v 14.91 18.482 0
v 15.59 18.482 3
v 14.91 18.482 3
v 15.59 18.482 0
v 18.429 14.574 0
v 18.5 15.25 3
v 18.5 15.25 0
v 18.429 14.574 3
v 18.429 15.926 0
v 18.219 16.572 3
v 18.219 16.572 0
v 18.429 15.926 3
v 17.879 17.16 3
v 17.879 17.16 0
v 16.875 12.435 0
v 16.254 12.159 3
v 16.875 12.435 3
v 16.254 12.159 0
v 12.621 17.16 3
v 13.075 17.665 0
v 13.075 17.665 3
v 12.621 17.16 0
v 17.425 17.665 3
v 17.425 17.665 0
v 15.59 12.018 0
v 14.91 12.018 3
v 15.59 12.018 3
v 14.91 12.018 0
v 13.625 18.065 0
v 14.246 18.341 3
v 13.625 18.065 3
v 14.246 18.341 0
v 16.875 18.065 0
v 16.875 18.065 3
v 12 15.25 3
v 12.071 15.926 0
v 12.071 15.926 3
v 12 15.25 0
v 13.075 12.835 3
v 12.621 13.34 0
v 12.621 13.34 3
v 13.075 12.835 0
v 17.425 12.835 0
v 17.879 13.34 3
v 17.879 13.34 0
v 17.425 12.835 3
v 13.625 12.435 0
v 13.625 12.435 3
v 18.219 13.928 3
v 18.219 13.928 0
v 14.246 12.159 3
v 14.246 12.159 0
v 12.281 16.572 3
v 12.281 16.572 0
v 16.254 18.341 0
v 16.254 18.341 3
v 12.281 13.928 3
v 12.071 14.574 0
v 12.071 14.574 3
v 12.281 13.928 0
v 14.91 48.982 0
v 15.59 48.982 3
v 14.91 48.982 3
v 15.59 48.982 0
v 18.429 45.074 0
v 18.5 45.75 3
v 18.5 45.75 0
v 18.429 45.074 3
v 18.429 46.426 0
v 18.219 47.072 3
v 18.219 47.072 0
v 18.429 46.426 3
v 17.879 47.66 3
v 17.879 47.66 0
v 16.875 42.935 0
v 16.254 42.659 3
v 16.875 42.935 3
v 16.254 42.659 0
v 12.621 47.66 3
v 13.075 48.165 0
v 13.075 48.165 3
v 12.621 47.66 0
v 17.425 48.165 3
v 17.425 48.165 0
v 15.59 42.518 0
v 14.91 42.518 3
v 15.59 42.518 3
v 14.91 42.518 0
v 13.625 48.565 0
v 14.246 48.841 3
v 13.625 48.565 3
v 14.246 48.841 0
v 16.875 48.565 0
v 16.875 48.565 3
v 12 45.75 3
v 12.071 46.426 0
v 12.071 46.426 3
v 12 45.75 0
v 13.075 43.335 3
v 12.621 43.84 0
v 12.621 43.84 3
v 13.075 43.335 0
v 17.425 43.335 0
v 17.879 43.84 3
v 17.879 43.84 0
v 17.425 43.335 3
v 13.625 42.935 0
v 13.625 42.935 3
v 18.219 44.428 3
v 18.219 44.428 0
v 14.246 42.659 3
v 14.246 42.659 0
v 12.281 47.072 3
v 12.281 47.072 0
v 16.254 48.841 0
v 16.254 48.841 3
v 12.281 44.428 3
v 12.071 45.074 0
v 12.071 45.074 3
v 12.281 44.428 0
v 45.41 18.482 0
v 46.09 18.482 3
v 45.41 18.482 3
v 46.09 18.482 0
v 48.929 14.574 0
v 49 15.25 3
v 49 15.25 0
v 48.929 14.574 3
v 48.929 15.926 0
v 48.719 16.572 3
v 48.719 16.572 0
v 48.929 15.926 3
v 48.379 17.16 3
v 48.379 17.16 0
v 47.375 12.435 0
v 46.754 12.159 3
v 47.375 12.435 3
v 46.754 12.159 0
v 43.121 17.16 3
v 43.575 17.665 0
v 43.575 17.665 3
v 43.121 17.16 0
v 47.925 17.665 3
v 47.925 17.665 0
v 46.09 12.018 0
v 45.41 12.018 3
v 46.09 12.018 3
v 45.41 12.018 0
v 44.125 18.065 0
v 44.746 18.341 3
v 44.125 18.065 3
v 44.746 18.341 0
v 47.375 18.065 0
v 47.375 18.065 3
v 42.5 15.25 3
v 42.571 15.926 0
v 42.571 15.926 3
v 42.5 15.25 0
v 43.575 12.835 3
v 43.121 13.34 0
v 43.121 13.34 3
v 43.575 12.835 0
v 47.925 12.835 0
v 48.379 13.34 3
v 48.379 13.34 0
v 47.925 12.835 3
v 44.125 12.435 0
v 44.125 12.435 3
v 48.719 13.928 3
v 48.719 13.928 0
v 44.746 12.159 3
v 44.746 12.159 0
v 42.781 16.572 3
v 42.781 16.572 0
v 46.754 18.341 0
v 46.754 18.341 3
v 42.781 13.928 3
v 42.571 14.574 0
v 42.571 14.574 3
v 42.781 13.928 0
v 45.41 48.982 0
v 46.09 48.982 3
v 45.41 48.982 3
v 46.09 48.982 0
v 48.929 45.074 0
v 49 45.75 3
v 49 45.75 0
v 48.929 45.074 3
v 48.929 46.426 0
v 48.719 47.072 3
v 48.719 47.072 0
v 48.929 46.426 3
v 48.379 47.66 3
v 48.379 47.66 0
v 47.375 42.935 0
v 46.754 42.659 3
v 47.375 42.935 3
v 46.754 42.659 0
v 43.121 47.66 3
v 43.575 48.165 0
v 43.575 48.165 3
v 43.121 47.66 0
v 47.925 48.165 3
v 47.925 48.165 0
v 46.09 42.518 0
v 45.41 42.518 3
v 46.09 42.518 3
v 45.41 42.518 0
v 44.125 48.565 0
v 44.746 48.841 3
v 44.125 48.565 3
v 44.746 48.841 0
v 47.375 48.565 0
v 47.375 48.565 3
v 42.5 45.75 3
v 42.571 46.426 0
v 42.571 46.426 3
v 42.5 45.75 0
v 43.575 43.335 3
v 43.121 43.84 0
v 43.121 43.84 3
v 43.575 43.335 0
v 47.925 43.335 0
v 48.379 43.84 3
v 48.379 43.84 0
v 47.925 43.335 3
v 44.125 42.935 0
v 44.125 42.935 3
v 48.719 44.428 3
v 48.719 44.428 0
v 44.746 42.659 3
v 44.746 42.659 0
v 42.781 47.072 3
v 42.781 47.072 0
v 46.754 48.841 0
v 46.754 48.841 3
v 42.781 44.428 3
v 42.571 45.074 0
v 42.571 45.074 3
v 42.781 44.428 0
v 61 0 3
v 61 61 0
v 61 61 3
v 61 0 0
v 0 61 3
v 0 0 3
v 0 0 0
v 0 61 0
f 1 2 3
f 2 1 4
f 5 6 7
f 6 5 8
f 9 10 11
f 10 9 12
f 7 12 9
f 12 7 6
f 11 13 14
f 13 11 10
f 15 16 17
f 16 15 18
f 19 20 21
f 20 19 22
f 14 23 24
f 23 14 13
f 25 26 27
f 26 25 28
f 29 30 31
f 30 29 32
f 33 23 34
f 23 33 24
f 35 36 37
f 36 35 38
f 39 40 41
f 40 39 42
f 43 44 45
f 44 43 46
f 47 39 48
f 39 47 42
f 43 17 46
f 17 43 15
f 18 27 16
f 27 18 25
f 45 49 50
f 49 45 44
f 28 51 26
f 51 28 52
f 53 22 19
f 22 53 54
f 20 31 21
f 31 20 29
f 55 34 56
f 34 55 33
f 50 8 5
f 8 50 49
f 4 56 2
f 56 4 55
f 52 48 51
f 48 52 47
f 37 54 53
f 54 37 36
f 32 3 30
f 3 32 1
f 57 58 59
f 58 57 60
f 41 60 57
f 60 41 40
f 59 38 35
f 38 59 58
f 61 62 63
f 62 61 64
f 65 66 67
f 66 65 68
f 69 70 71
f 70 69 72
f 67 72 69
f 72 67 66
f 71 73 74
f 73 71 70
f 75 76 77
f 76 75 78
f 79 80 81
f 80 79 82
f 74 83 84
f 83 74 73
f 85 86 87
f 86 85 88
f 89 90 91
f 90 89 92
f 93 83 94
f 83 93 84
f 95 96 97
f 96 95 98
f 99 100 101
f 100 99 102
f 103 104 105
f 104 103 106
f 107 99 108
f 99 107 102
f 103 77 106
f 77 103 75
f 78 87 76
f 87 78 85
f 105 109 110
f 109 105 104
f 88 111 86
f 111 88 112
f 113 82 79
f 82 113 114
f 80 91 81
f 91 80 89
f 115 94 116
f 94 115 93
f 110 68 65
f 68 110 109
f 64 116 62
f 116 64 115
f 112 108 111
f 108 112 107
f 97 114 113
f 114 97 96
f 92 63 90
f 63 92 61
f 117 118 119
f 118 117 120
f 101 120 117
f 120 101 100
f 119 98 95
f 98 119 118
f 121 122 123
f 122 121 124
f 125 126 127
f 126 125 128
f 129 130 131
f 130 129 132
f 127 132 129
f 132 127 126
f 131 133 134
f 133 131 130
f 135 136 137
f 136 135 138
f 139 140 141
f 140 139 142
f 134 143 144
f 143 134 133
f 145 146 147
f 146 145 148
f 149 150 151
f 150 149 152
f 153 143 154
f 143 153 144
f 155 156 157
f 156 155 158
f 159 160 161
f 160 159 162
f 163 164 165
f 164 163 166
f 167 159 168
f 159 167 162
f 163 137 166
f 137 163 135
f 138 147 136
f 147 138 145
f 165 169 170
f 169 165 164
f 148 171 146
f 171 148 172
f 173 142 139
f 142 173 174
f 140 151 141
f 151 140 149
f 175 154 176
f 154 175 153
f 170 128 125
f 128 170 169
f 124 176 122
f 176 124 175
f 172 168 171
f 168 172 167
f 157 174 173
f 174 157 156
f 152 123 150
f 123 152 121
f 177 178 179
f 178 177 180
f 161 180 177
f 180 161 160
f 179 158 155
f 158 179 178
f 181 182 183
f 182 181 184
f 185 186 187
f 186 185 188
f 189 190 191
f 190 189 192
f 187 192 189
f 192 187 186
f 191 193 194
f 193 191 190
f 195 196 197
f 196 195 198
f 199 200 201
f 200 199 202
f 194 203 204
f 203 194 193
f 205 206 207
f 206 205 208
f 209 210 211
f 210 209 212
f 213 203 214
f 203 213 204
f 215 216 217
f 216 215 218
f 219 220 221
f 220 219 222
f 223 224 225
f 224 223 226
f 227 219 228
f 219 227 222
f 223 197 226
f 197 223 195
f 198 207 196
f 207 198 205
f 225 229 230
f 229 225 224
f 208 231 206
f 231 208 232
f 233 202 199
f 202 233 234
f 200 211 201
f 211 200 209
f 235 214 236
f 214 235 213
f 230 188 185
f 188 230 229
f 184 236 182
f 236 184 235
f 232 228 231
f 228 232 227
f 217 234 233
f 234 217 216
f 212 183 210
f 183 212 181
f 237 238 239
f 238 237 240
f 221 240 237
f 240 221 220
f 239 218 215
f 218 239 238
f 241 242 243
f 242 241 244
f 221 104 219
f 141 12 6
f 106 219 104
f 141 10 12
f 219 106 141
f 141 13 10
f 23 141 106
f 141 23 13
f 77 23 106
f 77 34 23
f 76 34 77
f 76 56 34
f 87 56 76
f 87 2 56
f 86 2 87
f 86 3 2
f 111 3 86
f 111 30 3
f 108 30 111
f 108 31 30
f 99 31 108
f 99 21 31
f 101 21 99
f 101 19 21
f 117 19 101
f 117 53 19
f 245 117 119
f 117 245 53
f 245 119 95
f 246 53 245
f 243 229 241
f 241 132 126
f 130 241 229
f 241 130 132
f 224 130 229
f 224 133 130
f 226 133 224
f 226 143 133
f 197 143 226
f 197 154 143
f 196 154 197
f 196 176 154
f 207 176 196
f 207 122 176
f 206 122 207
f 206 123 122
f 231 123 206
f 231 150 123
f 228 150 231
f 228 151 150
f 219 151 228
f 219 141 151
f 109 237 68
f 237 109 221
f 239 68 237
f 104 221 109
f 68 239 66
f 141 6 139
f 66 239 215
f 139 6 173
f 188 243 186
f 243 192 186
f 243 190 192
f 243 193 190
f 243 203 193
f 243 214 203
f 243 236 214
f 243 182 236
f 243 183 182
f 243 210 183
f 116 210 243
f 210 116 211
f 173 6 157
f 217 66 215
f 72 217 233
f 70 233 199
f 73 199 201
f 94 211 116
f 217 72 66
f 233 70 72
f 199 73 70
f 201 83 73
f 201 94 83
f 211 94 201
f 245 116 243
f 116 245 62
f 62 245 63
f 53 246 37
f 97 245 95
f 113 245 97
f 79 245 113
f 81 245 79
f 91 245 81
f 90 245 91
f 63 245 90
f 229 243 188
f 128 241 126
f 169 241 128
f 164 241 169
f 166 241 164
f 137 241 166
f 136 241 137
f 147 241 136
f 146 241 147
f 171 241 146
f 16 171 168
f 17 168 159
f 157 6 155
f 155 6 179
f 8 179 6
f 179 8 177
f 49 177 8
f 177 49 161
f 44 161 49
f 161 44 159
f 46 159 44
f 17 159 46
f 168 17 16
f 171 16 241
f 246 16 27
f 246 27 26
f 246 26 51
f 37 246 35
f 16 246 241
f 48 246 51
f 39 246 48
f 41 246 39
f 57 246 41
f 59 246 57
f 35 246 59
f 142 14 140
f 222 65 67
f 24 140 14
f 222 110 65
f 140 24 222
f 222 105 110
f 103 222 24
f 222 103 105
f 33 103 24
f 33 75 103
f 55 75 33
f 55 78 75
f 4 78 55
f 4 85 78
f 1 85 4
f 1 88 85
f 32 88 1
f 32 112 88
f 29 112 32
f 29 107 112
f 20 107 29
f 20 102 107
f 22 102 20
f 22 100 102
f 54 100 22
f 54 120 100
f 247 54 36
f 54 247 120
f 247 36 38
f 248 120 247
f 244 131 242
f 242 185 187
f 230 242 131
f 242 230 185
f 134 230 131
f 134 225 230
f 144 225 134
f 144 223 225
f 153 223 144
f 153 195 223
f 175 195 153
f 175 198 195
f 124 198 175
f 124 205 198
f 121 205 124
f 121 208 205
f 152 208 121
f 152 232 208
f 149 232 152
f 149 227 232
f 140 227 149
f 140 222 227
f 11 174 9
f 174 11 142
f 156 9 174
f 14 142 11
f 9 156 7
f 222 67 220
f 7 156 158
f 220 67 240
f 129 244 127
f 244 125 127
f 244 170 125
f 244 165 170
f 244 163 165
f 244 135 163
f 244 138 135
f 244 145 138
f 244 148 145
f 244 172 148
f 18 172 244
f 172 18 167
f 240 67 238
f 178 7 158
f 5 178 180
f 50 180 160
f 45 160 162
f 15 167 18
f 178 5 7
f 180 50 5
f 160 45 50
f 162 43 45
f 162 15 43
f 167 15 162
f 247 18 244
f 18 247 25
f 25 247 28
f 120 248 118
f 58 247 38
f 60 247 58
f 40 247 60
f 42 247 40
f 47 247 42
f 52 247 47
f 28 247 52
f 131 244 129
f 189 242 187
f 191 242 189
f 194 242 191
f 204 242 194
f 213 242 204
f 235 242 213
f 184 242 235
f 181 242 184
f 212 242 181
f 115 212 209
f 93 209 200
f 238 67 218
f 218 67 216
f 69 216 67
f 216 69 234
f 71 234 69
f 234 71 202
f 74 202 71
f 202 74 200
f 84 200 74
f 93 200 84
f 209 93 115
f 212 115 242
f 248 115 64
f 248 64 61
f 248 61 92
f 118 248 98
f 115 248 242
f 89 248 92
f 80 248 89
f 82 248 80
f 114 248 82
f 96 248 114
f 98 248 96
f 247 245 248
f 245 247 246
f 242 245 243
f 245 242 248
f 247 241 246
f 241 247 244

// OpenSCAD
// file: ../888_1010.scad
include <../parameters.scad>


module 888_1010() {
	difference() {
		cube([ALU_profile_width*2, ALU_profile_width*2, 3]);

		for(i=[0:1:1]) {
			for(k=[0:1:1]) {
				translate([ALU_profile_width/2+ALU_profile_width*i, ALU_profile_width/2+ALU_profile_width*k, -1])
				cylinder(d=M6_screw_diameter, h=5, $fn=30);
			}
		}
	}
}

888_1010();
// file: ../../parameters.scad
maximum_printable_size = 150;

layer_thickness = 0.3;
global_clearance = 0.5;


//Screw diameter and nut for M10 [mm]
M10_screw_diameter = 10.4;
M10_head_height = 10;
M10_head_diameter = 16+0.5;
M10_nut_height = 10.5;
M10_nut_diameter = 25.5;
M10_nut_pocket = 22.3;

//Screw diameter for M8 [mm]
M8_screw_diameter = 8.6;
M8_head_height = 8;
M8_head_diameter = 13.5;
M8_nut_height = 7.5;
M8_square_nut_thin_height = 4.5;
M8_nut_diameter = 14.4 + 0.5;
M8_nut_pocket = 13 + 0.5;
M8_washer_diameter = 16;
M8_washer_thickness = 1.5;


//Screw diameter and nut for M6 [mm]
M6_screw_diameter=6.5;
M6_head_diameter = 10+0.5;
M6_head_height = 6;
M6_nut_height = 4.9;
M6_nut_diameter = 11.8;
M6_nut_pocket = 10.4;
M6_square_nut_height = 3;
M6_square_nut_diameter = 10;
M6_washer_thickness = 1.6;

//Screw diameter and nut for M5 [mm]
M5_screw_diameter=5.5;
M5_head_height = 5;
M5_head_diameter = 13+0.5;
M5_nut_height = 4.5;
M5_nut_diameter = 9.4;
M5_nut_pocket = 8.4;

//Screw diameter and nut for M4 [mm]
M4_screw_diameter=4.5;
M4_screw_head_height = 4;
M4_nut_height = 3.2;
M4_nut_diameter = 8.4;
M4_nut_pocket = 7.5;

//Screw diameter and nut for M3 [mm]
M3_screw_diameter = 3.2;
M3_nut_height = 2.7;
M3_nut_diameter = 6.6;
M3_nut_pocket = 5.6;
M3_screw_head_height = 3;

//Screw diameter and nut for M2,5 [mm]
M2_5_screw_diameter = 2.7;
M2_5_nut_height = 2.3;
M2_5_nut_diameter = 6;
M2_5_nut_pocket = 5.5;

//ALU profile
ALU_profile_width = 30.5;
ALU_profile_holder_wall_thickness = 3;
ALU_profile_groove_width = 8;





// Platform parameters ////////////////////////////////////////////
// Main profile parameters
starting_platform_length = 1000; // Main platform profile length
starting_platform_angle = 10; // Angle of attack for platform

// Main cube profile lengths
profile_length_x = 600;
profile_length_y = 600;
profile_length_z = 260;


// Compressor dimensions
compressor_length_x = 410;
compressor_length_y = 140;
compressor_length_z = 310;

// Platform front support parameters
front_holder_width = 160;
front_holder_angle = 25;
front_holder_height = 60;
front_holder_offset = 15;
front_holder_height_offset = 110;

// Lock moving servo parameters
// static par.
servo_length = 40;
servo_width = 20;
servo_height = 40;
servo_axle_offset = 12.5;
servo_axle_height = 5;
servo_movement_angle = 60;
servo_movement_angle_offset = -35; // angle offset up
servo_force = 1.65; // [N/m] torque of servo

// dynamic par.
servo_arm_length = servo_width/2+ALU_profile_width/2+ALU_profile_holder_wall_thickness+4;
servo_travel_y = cos((servo_movement_angle-abs(servo_movement_angle_offset))/2)*servo_arm_length;
servo_arm_hole_length = (servo_arm_length/cos(servo_movement_angle/2))-servo_arm_length+M3_screw_diameter;
servo_joint_offset = sin(servo_movement_angle+servo_movement_angle_offset)*(servo_arm_length+servo_arm_hole_length)+servo_axle_offset;
servo_joint_offset_by_angle = -tan(servo_movement_angle_offset)*servo_arm_length;
servo_max_linear_force = servo_force/(servo_arm_length/1000); // max servo linear force [N]
servo_min_linear_force = cos(servo_movement_angle+abs(servo_movement_angle_offset))*servo_max_linear_force; // min servo linear force [N] in the most extreme position
servo_holding_linear_force = cos(servo_movement_angle+servo_movement_angle_offset)*servo_max_linear_force; // min servo linear force [N] in holding position

// Lock static parameters
lock_screws_dia = 3.2;
lock_depth = 20;
lock_axle_diameter = 15;
lock_grab_axle_dia = 13;
lock_arms_joint_offset = 30;
lock_arms_joint_angle = 90-.01;
lock_tooth_width = 2;

lock_tube_angle = 0;

// Lock dynamic parameters
lock_push_force = (servo_holding_linear_force/cos(lock_arms_joint_angle))/cos(lock_arms_joint_angle); // lock arm pushing force on linear servo joint
lock_push_arm_length = 45;
lock_arm_force_ratio = 1; // lock arm change holding force ratio (0.5 = arm will have half holding force)
lock_hold_arm_length = lock_push_arm_length/lock_arm_force_ratio;
lock_holding_force = lock_push_force*lock_arm_force_ratio;
lock_joint_arm_length = lock_push_arm_length;
// main file
//@set_slicing_config(../../slicing/default.ini)
include <../../parameters.scad>

use <../888_1010.scad>

888_1010();
